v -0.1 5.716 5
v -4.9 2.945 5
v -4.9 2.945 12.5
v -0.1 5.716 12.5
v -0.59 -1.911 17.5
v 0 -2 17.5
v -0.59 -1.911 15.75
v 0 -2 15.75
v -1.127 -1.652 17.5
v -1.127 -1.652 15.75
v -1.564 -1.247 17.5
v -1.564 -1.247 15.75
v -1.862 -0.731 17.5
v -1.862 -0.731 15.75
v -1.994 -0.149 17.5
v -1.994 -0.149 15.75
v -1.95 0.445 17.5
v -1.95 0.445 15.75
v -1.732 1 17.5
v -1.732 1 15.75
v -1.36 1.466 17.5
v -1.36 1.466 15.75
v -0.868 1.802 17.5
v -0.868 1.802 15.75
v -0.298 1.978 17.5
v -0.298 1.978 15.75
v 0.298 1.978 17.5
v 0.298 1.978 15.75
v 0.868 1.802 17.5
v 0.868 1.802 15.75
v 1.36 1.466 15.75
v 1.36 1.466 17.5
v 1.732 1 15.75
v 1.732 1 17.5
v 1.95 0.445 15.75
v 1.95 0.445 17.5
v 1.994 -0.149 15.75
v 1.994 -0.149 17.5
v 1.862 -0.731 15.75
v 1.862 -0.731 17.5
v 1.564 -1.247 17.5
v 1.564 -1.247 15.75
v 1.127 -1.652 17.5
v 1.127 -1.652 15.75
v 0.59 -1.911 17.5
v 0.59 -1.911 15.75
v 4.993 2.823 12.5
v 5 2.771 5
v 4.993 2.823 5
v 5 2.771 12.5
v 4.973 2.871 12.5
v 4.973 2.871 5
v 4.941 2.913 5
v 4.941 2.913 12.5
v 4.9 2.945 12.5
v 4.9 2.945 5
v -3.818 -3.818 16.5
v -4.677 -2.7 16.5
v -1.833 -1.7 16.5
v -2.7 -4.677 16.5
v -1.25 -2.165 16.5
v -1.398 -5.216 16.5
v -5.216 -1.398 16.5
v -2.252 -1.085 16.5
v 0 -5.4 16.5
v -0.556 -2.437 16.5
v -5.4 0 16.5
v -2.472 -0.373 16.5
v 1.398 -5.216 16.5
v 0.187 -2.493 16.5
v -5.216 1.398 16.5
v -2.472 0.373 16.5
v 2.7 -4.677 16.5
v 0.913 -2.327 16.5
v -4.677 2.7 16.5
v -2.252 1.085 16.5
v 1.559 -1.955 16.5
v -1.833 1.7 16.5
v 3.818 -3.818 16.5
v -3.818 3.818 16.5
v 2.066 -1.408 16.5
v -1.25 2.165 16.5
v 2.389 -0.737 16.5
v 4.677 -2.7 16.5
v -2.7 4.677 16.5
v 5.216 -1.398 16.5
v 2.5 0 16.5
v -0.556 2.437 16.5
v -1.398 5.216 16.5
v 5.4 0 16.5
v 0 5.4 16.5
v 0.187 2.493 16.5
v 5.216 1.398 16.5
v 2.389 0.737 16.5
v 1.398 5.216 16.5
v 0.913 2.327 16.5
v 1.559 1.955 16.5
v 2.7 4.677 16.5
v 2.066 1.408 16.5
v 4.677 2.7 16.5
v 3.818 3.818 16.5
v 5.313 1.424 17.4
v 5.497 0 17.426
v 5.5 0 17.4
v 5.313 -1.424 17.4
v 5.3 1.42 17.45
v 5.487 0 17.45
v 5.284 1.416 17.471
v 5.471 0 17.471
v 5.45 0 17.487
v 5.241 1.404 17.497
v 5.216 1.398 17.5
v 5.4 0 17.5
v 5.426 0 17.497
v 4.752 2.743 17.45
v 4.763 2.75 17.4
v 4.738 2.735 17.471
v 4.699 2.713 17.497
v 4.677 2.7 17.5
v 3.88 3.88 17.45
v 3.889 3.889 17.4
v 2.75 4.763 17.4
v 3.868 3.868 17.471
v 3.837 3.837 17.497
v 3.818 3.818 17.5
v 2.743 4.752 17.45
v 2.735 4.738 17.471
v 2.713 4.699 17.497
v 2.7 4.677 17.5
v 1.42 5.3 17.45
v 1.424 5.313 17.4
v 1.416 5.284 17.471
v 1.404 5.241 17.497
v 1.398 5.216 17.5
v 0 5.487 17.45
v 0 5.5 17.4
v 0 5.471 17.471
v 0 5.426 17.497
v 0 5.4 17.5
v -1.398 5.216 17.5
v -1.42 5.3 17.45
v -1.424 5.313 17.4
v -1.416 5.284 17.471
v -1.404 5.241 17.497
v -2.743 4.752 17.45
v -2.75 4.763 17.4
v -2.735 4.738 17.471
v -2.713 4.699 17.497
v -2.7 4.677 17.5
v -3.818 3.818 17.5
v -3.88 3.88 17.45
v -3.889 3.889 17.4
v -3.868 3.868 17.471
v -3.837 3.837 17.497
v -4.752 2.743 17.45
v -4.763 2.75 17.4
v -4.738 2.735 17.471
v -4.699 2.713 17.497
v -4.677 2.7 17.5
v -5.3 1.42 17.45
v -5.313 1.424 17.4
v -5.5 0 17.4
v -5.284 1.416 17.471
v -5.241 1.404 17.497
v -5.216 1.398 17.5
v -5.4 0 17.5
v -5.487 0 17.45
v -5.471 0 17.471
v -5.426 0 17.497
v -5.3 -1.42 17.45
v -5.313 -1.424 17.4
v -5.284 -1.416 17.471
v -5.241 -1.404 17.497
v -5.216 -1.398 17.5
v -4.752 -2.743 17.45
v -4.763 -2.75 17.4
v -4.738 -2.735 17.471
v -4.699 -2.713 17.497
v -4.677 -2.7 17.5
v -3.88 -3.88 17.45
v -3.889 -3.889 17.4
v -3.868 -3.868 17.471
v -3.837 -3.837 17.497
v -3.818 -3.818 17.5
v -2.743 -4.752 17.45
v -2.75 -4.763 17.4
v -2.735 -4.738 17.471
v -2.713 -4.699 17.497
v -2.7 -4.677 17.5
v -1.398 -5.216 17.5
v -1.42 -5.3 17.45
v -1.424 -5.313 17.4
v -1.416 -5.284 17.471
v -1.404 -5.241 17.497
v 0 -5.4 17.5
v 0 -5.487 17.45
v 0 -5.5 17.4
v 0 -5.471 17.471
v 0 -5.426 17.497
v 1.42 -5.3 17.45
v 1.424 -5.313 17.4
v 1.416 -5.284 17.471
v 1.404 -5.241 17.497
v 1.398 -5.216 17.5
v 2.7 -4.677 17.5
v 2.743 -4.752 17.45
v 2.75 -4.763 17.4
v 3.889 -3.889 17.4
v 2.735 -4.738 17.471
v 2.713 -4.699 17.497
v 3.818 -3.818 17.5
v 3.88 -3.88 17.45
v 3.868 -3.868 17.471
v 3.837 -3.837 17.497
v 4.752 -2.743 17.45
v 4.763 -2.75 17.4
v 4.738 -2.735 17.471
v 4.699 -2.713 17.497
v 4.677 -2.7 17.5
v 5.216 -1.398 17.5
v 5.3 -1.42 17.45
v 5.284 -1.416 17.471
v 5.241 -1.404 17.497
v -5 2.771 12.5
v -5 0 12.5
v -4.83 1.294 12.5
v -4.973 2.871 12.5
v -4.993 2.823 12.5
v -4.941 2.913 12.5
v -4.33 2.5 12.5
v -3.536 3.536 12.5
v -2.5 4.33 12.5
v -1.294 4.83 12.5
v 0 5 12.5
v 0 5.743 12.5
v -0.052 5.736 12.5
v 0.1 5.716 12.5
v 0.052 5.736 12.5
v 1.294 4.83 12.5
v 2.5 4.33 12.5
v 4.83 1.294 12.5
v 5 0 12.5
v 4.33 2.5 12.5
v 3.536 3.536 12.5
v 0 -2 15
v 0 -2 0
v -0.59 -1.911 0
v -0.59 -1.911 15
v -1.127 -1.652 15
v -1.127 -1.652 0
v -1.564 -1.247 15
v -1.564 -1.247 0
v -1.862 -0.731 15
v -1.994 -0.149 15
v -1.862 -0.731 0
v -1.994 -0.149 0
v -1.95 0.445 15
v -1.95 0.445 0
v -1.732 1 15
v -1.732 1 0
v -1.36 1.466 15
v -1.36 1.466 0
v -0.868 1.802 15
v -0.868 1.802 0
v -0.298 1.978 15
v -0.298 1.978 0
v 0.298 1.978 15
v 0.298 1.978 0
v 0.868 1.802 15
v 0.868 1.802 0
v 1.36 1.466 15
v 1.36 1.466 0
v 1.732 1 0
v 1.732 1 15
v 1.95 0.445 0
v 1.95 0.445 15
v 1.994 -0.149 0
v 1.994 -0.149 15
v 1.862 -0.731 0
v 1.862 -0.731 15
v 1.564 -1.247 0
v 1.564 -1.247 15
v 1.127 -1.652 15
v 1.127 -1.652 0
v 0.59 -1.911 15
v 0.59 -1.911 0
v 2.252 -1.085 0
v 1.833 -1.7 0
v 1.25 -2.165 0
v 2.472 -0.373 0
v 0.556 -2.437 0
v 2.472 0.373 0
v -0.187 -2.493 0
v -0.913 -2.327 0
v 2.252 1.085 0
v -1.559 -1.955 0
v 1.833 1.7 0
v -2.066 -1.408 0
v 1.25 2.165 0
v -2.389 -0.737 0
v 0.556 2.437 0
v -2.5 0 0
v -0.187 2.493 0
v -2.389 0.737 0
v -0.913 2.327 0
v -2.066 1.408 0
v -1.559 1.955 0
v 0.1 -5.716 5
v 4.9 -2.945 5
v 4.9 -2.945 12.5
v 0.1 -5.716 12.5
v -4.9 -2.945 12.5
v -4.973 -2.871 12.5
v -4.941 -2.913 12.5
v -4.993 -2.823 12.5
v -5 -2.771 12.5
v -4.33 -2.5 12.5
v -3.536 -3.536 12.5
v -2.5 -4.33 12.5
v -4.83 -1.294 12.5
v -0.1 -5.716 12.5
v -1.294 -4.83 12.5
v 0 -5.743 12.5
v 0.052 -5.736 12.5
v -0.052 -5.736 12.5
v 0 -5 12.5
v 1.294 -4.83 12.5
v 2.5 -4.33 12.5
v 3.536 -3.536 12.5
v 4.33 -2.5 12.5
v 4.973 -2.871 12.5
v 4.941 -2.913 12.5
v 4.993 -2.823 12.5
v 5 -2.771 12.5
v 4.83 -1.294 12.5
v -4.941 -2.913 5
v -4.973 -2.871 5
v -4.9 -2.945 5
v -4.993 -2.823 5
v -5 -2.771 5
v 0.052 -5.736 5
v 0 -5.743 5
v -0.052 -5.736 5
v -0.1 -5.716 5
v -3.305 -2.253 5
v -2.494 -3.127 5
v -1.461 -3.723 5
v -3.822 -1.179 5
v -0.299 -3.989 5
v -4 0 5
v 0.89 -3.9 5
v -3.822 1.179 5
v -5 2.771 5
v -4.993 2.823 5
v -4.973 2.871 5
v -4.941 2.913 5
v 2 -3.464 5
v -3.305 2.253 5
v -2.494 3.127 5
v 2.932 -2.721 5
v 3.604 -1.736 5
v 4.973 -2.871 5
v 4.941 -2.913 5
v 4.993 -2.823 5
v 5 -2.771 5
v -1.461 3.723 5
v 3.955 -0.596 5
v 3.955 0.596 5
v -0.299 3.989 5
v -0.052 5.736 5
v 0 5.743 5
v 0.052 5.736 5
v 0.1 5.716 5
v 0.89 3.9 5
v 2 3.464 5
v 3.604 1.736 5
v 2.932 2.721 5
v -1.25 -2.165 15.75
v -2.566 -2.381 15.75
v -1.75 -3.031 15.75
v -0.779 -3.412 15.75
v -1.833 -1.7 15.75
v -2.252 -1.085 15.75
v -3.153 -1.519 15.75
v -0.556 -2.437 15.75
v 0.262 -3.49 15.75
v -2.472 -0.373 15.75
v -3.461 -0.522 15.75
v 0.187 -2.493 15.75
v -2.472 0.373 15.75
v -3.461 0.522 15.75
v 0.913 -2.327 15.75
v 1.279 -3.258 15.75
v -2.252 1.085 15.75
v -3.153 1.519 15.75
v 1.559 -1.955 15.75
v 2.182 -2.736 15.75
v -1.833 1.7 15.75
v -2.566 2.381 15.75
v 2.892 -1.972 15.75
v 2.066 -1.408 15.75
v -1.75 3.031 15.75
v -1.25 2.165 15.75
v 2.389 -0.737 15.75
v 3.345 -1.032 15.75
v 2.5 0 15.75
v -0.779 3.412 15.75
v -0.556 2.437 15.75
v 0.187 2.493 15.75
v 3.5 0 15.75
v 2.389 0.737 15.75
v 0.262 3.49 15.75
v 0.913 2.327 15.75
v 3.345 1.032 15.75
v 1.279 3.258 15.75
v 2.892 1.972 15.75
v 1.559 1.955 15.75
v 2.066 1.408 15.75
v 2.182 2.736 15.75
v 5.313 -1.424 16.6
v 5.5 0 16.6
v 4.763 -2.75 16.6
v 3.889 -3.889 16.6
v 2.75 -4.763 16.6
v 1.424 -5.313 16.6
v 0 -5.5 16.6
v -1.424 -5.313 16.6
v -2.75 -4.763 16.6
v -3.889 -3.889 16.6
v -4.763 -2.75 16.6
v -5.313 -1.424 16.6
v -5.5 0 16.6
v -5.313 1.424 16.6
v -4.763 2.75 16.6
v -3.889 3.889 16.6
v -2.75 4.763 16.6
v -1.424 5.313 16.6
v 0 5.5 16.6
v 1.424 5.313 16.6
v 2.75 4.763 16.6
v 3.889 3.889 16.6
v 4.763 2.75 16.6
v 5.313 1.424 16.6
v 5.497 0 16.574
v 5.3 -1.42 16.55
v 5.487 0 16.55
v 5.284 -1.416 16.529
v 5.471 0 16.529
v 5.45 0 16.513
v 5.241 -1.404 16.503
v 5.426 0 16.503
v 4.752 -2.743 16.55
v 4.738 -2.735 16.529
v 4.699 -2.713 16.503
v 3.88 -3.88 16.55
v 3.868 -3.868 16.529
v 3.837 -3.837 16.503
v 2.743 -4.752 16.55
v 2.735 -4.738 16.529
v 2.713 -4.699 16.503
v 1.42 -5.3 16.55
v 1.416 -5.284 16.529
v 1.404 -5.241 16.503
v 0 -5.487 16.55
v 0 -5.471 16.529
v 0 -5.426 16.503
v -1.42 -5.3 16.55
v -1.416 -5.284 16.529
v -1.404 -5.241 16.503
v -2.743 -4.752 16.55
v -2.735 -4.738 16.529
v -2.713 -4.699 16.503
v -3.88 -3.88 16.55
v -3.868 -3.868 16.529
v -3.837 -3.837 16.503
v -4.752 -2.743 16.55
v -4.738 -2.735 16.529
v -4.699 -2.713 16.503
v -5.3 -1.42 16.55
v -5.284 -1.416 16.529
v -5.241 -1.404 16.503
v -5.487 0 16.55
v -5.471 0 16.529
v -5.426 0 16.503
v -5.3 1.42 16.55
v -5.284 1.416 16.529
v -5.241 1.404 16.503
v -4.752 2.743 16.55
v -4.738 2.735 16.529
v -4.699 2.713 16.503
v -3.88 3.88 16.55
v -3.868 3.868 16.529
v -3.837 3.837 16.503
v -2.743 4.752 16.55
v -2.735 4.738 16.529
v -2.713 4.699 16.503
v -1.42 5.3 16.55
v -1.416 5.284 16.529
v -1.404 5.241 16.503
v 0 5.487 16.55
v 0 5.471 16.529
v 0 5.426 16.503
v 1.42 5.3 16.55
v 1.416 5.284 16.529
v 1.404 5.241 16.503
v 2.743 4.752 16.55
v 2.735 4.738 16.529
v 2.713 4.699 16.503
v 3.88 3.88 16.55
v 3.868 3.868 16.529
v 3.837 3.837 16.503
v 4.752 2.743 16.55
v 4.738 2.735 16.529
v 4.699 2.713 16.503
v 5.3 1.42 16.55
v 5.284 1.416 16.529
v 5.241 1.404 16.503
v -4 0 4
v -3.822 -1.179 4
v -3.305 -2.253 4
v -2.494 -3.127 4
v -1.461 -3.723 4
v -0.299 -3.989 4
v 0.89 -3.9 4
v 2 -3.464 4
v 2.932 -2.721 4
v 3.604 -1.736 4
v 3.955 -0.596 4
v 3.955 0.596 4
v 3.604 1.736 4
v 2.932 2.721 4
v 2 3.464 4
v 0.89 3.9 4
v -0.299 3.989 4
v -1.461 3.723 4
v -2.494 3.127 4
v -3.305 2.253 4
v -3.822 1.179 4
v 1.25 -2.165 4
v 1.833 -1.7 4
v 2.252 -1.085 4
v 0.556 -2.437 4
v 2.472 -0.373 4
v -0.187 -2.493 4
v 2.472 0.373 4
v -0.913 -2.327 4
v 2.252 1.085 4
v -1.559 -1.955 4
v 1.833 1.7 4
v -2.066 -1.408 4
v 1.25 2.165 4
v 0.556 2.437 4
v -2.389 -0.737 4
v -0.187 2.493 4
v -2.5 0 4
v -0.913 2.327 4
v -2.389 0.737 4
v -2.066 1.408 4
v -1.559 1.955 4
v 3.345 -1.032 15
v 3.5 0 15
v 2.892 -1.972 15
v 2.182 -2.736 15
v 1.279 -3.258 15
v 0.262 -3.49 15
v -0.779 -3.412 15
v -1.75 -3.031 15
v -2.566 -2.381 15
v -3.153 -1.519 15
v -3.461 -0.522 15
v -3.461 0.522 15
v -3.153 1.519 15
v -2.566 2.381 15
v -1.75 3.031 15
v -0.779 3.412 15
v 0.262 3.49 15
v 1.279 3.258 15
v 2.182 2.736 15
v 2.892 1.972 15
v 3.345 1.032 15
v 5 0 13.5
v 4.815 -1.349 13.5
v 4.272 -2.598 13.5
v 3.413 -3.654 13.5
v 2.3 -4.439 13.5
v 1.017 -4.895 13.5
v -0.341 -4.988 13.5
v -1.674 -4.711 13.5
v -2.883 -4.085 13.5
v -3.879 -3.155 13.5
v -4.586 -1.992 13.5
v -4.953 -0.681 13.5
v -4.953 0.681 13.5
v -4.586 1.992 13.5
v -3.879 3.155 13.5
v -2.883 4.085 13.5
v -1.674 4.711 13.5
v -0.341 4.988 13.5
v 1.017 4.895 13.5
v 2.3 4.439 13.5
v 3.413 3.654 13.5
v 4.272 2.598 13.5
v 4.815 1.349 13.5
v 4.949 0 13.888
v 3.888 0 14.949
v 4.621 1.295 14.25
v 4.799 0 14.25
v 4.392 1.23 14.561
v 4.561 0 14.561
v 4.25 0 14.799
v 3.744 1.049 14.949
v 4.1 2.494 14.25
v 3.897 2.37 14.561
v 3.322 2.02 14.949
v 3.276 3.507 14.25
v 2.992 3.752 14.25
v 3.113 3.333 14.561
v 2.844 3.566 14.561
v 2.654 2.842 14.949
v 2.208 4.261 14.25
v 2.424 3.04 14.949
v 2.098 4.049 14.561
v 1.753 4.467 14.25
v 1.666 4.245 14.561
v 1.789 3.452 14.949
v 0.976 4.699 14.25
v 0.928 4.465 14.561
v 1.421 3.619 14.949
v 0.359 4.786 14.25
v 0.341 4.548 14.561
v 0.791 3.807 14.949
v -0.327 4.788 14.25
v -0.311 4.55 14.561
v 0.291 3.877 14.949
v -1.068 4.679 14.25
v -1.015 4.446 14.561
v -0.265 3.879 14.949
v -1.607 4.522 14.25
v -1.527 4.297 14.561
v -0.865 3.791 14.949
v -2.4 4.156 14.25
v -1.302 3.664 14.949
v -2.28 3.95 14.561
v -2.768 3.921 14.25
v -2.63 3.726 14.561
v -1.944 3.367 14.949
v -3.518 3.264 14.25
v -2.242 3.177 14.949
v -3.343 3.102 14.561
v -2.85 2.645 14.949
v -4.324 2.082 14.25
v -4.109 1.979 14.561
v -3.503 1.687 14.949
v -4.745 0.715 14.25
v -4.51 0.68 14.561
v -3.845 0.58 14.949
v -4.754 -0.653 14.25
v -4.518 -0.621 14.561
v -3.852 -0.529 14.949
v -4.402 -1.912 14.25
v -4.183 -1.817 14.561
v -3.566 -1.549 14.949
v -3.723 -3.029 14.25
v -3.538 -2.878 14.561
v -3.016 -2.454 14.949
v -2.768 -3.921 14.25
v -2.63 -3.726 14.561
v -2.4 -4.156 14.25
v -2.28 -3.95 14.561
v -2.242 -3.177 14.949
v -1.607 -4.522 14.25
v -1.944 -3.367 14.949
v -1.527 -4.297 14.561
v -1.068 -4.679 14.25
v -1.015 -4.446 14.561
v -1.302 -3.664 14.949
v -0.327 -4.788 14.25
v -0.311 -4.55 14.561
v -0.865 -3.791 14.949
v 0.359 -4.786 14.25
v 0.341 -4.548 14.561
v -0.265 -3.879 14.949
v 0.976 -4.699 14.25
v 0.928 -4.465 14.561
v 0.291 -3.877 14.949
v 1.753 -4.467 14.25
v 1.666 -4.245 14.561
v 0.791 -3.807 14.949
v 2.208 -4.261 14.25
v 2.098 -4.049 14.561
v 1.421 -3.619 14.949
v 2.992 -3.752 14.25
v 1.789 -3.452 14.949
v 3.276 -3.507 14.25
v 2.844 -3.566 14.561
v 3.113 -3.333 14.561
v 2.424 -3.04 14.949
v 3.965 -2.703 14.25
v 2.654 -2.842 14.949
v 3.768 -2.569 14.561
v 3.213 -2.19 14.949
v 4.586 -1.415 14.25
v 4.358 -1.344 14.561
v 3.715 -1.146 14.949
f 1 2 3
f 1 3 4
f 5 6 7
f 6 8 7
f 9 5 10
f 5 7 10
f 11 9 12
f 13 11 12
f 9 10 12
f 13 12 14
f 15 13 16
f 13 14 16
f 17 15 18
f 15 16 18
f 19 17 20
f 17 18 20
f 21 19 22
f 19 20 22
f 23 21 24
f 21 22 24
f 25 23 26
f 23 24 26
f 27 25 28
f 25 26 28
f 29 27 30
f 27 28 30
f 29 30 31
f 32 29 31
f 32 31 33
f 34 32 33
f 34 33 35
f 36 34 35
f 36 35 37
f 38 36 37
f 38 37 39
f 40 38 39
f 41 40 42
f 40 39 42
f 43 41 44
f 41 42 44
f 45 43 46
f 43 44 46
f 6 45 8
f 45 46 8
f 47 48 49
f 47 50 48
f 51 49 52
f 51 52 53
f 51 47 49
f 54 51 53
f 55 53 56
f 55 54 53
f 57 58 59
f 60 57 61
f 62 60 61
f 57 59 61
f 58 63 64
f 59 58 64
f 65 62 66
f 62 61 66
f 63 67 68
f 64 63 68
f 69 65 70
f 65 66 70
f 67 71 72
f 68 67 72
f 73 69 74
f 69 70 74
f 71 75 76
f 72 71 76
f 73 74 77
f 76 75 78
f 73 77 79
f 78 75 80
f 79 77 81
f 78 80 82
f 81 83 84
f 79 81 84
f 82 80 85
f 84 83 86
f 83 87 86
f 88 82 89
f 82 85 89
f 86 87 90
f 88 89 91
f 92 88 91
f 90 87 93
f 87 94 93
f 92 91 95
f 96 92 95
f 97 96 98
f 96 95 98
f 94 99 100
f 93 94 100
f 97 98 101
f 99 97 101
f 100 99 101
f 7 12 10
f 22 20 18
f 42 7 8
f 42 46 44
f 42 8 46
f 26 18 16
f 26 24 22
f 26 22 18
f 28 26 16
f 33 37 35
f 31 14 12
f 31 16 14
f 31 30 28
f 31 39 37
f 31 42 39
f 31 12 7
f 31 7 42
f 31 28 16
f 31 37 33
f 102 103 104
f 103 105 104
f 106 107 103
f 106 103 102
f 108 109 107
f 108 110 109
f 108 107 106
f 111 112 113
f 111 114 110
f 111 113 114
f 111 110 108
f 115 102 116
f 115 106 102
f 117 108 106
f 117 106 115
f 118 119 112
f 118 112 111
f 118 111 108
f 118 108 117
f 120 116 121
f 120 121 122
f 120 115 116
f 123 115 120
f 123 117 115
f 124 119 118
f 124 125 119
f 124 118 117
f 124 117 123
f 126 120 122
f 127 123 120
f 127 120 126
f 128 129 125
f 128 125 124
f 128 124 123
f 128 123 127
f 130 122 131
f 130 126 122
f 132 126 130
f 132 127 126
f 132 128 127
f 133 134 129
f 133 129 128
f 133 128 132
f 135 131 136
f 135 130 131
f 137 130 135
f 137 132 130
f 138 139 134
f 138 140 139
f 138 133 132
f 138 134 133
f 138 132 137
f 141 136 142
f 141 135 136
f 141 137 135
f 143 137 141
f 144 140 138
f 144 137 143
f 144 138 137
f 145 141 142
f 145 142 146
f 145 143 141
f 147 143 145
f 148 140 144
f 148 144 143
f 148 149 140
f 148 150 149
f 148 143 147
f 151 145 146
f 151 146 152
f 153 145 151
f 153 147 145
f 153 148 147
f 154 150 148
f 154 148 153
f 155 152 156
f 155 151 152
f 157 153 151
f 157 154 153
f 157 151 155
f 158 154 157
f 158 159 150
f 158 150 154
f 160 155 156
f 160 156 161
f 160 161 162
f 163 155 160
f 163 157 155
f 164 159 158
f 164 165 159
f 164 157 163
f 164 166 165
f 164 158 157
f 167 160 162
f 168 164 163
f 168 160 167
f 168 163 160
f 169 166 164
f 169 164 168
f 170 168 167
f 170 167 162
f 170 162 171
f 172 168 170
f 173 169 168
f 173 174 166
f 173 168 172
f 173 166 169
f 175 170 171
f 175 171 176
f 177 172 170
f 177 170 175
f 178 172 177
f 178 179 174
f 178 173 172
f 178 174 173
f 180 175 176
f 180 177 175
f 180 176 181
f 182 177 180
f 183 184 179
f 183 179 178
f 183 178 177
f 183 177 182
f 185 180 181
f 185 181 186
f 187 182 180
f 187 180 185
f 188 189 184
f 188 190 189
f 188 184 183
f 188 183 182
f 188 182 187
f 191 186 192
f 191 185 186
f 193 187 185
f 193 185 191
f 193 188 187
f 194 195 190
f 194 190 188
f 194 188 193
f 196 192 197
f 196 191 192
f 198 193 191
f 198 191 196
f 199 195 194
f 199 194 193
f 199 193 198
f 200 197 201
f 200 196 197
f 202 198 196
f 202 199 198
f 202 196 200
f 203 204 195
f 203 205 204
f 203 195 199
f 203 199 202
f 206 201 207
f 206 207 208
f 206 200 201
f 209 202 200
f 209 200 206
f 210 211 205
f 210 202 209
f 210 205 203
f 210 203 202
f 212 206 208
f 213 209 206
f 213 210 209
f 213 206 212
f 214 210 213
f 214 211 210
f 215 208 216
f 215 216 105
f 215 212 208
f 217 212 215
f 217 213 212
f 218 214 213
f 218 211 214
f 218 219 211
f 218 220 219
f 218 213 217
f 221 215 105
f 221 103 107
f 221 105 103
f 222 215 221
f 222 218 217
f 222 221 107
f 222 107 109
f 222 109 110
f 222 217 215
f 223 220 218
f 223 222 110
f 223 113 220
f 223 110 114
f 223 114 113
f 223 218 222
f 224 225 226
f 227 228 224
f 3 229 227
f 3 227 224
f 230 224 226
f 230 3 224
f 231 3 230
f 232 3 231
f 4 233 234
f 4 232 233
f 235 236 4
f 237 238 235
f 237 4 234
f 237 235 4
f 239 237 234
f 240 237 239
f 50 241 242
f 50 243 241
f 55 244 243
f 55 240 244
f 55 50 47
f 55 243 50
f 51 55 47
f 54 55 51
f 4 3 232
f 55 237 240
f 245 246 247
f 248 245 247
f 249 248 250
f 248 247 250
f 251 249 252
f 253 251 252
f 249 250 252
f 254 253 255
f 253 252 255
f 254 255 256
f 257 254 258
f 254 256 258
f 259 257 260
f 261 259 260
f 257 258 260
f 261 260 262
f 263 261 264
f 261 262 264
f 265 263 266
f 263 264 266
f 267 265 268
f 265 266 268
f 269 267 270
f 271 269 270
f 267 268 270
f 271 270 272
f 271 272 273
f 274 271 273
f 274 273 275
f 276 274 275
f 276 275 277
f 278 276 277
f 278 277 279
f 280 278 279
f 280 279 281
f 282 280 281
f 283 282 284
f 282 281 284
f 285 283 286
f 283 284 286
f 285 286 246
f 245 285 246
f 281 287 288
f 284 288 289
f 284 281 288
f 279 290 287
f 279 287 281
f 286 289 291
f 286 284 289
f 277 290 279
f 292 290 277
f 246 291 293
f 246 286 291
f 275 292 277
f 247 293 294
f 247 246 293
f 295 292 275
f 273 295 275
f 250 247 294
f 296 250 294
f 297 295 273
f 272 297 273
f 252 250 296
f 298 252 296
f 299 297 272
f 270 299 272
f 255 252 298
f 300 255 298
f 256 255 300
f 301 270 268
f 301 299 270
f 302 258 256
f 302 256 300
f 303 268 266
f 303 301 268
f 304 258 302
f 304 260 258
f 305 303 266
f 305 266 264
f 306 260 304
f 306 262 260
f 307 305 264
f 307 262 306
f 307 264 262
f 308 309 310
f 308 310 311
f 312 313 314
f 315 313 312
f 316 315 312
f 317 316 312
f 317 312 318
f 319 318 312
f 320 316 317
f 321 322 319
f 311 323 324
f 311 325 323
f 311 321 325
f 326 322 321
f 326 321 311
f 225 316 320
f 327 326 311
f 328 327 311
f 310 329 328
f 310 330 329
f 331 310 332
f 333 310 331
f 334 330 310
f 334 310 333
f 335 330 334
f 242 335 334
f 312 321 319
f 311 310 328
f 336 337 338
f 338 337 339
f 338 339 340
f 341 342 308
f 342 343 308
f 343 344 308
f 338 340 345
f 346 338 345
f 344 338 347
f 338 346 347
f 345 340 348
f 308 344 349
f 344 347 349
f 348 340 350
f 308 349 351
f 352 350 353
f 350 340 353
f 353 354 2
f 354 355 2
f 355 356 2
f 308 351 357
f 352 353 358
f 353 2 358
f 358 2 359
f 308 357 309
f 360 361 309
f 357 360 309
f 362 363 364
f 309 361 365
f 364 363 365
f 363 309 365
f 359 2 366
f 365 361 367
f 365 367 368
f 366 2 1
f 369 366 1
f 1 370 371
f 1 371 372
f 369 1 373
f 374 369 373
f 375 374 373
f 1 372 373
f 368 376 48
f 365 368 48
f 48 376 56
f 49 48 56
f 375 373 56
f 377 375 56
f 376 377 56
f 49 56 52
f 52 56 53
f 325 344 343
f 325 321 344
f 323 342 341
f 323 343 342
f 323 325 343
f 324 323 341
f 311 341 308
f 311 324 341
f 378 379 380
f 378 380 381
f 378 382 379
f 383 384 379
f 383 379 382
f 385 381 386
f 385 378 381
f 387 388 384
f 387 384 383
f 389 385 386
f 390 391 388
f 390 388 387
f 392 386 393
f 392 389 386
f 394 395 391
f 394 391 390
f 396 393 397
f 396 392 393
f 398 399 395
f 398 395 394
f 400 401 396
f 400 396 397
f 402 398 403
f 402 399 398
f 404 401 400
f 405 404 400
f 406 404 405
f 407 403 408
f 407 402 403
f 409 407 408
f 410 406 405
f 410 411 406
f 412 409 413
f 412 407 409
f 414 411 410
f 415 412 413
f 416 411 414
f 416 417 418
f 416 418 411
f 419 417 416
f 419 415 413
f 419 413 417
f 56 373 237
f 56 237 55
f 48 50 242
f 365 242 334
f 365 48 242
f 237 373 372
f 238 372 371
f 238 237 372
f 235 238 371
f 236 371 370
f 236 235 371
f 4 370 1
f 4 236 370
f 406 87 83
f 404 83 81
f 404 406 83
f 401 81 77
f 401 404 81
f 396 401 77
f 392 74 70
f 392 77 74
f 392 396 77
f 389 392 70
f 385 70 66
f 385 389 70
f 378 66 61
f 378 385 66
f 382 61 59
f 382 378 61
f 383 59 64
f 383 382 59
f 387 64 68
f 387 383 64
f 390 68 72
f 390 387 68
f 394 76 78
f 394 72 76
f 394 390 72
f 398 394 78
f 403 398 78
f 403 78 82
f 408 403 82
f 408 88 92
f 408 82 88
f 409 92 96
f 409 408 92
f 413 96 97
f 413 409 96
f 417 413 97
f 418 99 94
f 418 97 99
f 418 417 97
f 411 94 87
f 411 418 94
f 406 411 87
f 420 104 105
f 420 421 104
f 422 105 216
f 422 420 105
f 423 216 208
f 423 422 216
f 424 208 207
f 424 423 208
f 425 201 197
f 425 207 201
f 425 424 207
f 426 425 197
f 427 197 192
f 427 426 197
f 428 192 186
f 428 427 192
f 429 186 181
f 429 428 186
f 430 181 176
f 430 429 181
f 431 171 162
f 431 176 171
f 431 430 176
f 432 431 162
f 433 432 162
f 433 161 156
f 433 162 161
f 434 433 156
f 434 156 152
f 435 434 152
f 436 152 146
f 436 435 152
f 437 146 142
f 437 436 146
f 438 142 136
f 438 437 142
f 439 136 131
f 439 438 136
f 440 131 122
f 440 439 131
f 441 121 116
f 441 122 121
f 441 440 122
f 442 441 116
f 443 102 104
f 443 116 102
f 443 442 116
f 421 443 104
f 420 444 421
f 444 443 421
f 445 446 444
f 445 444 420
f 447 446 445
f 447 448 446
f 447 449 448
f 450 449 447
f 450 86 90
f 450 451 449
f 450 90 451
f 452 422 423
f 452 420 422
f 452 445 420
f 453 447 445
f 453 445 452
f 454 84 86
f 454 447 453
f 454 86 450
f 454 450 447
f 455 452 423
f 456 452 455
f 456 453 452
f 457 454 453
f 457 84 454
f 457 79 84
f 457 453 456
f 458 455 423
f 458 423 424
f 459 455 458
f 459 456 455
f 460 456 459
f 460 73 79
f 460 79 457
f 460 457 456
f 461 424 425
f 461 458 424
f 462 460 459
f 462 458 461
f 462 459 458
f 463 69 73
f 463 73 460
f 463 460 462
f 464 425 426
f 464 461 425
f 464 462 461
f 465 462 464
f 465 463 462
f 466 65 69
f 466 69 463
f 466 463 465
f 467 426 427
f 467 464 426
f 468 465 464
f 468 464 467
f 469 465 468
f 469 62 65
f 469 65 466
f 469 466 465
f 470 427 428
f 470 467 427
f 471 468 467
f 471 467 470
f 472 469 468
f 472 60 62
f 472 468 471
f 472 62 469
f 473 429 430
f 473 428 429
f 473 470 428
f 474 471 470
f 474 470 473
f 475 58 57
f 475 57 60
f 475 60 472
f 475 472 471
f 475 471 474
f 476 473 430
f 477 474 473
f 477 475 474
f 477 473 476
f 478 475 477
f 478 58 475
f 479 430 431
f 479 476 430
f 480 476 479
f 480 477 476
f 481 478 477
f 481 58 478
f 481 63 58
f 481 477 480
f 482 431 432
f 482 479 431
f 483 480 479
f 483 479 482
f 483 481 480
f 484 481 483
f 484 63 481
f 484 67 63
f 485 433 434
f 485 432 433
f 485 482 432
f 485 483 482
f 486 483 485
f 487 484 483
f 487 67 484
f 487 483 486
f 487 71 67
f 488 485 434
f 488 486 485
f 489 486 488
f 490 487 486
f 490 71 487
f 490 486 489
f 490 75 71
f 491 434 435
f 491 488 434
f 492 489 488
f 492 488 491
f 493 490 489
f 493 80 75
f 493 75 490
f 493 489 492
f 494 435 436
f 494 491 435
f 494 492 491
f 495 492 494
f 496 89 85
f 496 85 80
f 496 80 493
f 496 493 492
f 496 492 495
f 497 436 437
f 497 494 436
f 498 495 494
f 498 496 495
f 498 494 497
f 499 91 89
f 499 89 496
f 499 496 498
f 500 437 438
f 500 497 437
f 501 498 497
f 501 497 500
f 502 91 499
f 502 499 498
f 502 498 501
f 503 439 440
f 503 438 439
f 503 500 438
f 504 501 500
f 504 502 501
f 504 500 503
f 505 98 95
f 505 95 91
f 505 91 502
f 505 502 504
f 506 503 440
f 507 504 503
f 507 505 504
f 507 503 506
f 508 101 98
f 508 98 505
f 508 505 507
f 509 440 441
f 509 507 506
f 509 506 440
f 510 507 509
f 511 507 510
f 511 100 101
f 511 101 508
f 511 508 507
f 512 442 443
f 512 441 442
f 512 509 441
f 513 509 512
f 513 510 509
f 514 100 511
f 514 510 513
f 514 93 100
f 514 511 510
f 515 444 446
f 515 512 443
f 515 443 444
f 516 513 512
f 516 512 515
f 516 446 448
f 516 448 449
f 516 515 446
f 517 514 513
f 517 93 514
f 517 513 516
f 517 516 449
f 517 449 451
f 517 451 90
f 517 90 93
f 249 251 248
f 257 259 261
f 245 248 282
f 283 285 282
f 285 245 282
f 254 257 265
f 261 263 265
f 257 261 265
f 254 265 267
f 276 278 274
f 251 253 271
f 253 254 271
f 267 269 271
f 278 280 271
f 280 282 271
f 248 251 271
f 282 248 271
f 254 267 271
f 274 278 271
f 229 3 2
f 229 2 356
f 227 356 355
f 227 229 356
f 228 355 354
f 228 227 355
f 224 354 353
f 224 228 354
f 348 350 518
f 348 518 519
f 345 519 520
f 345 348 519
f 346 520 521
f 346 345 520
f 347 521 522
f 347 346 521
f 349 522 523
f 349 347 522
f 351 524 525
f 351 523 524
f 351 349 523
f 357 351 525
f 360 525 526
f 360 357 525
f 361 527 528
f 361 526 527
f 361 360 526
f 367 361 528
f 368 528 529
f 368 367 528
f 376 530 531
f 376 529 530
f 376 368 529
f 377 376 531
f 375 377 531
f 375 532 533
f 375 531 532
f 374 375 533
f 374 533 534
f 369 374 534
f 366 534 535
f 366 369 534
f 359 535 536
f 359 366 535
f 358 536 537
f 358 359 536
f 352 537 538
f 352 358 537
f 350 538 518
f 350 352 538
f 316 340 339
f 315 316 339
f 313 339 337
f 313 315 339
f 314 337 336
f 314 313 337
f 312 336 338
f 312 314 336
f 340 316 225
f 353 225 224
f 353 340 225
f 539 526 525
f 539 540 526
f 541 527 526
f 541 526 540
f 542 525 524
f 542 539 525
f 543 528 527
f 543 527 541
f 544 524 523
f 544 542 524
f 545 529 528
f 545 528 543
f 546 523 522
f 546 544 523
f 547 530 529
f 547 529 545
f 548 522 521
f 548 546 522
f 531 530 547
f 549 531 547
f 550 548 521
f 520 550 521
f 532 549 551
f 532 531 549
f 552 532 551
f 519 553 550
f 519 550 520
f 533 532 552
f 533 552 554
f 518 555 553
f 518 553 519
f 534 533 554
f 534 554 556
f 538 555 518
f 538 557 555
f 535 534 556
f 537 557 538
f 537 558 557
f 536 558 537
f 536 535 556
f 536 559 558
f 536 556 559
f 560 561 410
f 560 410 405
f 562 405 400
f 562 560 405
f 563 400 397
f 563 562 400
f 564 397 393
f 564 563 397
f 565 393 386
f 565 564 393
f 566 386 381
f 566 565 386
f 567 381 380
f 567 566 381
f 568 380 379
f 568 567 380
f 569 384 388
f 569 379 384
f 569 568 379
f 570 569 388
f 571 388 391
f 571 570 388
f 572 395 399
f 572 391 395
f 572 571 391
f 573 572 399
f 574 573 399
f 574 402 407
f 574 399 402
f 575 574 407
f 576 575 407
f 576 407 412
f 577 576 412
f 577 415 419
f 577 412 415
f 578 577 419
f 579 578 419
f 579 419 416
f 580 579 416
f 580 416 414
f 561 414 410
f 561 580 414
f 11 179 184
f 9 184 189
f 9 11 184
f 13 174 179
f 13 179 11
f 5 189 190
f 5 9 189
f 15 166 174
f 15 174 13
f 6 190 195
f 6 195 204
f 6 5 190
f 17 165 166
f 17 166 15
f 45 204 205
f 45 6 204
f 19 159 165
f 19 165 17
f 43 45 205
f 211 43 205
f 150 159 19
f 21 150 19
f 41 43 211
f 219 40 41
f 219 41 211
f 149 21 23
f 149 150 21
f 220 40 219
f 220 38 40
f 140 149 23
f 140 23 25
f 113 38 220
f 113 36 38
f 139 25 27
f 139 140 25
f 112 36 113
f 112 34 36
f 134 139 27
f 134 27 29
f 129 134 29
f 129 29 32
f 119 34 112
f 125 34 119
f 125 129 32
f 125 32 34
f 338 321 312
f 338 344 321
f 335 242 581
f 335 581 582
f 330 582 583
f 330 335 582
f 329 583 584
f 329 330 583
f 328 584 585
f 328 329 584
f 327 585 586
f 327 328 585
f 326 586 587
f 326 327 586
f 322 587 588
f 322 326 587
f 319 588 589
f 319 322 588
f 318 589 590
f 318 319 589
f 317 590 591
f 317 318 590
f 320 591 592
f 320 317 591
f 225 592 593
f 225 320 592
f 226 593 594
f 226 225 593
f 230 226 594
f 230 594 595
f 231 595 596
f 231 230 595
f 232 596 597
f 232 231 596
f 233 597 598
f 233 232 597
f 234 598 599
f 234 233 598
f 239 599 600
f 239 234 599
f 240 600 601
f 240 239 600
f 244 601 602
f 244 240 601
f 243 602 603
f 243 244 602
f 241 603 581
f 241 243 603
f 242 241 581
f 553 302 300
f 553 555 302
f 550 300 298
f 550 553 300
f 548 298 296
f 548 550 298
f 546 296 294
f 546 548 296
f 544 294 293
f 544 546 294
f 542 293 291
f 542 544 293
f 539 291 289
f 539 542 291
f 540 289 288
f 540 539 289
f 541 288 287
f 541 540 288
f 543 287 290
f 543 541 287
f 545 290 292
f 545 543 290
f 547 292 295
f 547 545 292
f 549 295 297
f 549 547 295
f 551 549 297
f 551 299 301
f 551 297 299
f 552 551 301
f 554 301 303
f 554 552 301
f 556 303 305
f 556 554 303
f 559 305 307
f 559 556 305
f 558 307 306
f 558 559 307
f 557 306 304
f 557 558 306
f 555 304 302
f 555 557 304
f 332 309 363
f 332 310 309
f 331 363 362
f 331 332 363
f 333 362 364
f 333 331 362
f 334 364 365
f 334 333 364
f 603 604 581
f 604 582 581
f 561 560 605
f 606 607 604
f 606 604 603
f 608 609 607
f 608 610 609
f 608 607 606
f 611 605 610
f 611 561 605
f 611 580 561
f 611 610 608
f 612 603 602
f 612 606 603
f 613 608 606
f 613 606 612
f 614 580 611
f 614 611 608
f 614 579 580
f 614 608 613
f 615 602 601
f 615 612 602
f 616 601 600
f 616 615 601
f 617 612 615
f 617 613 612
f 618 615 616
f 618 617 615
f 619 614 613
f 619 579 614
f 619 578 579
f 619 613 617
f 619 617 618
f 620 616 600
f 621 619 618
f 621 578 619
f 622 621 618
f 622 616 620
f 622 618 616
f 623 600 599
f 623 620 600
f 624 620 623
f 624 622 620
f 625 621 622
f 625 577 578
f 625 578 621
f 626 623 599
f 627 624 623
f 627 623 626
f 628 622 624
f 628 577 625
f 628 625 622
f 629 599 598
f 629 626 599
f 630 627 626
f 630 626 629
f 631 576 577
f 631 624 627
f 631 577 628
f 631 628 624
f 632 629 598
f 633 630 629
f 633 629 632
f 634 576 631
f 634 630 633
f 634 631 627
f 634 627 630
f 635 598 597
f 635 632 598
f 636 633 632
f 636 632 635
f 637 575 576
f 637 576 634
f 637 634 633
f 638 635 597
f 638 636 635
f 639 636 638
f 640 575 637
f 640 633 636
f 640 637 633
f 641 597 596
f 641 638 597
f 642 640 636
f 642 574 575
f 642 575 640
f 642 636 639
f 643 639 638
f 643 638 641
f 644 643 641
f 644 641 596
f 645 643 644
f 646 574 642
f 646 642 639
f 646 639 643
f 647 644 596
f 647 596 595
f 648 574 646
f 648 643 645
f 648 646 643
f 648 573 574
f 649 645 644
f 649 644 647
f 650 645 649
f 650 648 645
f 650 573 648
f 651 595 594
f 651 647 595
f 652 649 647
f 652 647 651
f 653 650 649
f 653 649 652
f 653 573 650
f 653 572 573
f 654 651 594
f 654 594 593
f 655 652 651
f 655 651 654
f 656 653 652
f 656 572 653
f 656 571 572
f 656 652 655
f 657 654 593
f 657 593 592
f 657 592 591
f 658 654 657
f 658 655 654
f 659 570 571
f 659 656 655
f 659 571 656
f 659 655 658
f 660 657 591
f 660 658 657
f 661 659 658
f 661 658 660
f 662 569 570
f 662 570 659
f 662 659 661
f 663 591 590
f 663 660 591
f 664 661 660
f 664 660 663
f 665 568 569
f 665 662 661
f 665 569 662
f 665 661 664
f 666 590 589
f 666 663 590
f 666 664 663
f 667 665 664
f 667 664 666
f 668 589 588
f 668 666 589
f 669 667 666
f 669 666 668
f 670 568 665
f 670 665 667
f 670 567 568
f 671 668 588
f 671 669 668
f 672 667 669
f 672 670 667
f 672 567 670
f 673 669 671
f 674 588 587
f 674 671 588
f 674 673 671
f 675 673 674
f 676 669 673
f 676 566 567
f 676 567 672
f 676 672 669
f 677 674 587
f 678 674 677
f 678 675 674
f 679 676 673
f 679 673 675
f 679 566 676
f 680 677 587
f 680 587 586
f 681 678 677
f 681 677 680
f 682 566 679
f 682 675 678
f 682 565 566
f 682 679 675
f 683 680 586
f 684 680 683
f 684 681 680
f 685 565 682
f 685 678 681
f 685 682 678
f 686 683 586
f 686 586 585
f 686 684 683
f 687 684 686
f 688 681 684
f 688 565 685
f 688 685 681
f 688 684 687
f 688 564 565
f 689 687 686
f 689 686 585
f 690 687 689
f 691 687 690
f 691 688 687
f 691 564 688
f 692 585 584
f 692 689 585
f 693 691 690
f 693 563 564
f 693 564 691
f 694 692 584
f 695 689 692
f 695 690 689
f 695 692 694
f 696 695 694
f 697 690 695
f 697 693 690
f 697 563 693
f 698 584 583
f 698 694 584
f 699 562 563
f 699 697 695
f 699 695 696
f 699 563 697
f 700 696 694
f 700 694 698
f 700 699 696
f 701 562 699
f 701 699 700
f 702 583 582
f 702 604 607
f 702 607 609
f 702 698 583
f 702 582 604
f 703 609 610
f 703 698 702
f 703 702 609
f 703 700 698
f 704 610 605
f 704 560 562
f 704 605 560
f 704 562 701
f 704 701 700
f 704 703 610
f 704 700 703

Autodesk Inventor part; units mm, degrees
ref_plane "YZ Plane" through (0, 0, 0) normal (1, 0, 0) x (0, 1, 0)
ref_plane "XZ Plane" through (0, 0, 0) normal (0, 1, 0) x (-1, 0, 0)
ref_plane "XY Plane" through (0, 0, 0) normal (0, 0, 1) x (1, 0, 0)
sketch "Sketch1" plane through (0, 0, 0) normal (0, 1, 0) x (-1, 0, 0)
  line L0 (0, 0) -> (2.5, 0)
  line L1 (2.5, 0) -> (2.5, 4)
  line L2 (2.5, 4) -> (4, 4)
  line L3 (4, 4) -> (4, 5)
  line L4 (4, 5) -> (0, 5)
  line L5 (0, 5) -> (0, 0)
  dimension "d0" = 2.5
  dimension "d1" = 4
  dimension "d2" = 1.5
revolve "Revolution1" add sketch "Sketch1" angle 360 about axis through (0, 0, 5) along (0, 0, -1)
thread "Thread1" size "M5x0.8" class "6g" standard "ANSI Metric M Profile" full length
sketch "Sketch2" plane through (0, 0, 5) normal (0, 0, 1) x (1, 0, 0)
  line L0 (5, 2.8868) -> (5, -2.8868)
  line L1 (5, -2.8868) -> (0, -5.7735)
  line L2 (0, -5.7735) -> (-5, -2.8868)
  line L3 (-5, -2.8868) -> (-5, 2.8868)
  line L4 (-5, 2.8868) -> (0, 5.7735)
  line L5 (0, 5.7735) -> (5, 2.8868)
  point P0 (0, 0)
  point P1 (0, 0)
  dimension "d9" = 10
extrude "Extrusion1" add sketch "Sketch2" along normal blind 7.5
sketch "Sketch3" plane through (0, 0, 12.5) normal (0, 0, 1) x (1, 0, 0)
  circle A0 centre (0, 0) radius 5
  dimension "d12" = 10
extrude "Extrusion2" add sketch "Sketch3" along normal blind 2.5
fillet "Fillet1" radius 1.5 1 edges at (-5, 0, 15)
sketch "Sketch4" plane through (0, 0, 15) normal (0, 0, 1) x (1, 0, 0)
  circle A0 centre (0, 0) radius 2.5
  dimension "d16" = 5
extrude "Extrusion3" add sketch "Sketch4" along normal blind 1.5
sketch "Sketch5" plane through (0, 0, 16.5) normal (0, 0, 1) x (1, 0, 0)
  circle A0 centre (0, 0) radius 5.5
  dimension "d19" = 11
extrude "Extrusion4" add sketch "Sketch5" along normal blind 1
sketch "Sketch6" plane through (0, 0, 17.5) normal (0, 0, 1) x (1, 0, 0)
  circle A0 centre (0, 0) radius 2.5 projected
hole "Hole1" at (0, 0, 17.5) direction (0, 0, -1) diameter 4 end through all
fillet "Fillet2" radius 0.1 2 edges at (-5.5, 0, 17.5) (-5.5, 0, 16.5)
fillet "Fillet3" radius 0.2 6 edges at (0, -5.7735, 8.75) (5, -2.8868, 8.75) (5, 2.8868, 8.75) (0, 5.7735, 8.75) (-5, 2.8868, 8.75) (-5, -2.8868, 8.75)
sketch "Sketch7" plane through (0, 0, 15) normal (0, 0, 1) x (1, 0, 0)
  circle A0 centre (0, 0) radius 3.5
extrude "Extrusion5" add sketch "Sketch7" along normal blind 0.75
properties part number "Bowden"
